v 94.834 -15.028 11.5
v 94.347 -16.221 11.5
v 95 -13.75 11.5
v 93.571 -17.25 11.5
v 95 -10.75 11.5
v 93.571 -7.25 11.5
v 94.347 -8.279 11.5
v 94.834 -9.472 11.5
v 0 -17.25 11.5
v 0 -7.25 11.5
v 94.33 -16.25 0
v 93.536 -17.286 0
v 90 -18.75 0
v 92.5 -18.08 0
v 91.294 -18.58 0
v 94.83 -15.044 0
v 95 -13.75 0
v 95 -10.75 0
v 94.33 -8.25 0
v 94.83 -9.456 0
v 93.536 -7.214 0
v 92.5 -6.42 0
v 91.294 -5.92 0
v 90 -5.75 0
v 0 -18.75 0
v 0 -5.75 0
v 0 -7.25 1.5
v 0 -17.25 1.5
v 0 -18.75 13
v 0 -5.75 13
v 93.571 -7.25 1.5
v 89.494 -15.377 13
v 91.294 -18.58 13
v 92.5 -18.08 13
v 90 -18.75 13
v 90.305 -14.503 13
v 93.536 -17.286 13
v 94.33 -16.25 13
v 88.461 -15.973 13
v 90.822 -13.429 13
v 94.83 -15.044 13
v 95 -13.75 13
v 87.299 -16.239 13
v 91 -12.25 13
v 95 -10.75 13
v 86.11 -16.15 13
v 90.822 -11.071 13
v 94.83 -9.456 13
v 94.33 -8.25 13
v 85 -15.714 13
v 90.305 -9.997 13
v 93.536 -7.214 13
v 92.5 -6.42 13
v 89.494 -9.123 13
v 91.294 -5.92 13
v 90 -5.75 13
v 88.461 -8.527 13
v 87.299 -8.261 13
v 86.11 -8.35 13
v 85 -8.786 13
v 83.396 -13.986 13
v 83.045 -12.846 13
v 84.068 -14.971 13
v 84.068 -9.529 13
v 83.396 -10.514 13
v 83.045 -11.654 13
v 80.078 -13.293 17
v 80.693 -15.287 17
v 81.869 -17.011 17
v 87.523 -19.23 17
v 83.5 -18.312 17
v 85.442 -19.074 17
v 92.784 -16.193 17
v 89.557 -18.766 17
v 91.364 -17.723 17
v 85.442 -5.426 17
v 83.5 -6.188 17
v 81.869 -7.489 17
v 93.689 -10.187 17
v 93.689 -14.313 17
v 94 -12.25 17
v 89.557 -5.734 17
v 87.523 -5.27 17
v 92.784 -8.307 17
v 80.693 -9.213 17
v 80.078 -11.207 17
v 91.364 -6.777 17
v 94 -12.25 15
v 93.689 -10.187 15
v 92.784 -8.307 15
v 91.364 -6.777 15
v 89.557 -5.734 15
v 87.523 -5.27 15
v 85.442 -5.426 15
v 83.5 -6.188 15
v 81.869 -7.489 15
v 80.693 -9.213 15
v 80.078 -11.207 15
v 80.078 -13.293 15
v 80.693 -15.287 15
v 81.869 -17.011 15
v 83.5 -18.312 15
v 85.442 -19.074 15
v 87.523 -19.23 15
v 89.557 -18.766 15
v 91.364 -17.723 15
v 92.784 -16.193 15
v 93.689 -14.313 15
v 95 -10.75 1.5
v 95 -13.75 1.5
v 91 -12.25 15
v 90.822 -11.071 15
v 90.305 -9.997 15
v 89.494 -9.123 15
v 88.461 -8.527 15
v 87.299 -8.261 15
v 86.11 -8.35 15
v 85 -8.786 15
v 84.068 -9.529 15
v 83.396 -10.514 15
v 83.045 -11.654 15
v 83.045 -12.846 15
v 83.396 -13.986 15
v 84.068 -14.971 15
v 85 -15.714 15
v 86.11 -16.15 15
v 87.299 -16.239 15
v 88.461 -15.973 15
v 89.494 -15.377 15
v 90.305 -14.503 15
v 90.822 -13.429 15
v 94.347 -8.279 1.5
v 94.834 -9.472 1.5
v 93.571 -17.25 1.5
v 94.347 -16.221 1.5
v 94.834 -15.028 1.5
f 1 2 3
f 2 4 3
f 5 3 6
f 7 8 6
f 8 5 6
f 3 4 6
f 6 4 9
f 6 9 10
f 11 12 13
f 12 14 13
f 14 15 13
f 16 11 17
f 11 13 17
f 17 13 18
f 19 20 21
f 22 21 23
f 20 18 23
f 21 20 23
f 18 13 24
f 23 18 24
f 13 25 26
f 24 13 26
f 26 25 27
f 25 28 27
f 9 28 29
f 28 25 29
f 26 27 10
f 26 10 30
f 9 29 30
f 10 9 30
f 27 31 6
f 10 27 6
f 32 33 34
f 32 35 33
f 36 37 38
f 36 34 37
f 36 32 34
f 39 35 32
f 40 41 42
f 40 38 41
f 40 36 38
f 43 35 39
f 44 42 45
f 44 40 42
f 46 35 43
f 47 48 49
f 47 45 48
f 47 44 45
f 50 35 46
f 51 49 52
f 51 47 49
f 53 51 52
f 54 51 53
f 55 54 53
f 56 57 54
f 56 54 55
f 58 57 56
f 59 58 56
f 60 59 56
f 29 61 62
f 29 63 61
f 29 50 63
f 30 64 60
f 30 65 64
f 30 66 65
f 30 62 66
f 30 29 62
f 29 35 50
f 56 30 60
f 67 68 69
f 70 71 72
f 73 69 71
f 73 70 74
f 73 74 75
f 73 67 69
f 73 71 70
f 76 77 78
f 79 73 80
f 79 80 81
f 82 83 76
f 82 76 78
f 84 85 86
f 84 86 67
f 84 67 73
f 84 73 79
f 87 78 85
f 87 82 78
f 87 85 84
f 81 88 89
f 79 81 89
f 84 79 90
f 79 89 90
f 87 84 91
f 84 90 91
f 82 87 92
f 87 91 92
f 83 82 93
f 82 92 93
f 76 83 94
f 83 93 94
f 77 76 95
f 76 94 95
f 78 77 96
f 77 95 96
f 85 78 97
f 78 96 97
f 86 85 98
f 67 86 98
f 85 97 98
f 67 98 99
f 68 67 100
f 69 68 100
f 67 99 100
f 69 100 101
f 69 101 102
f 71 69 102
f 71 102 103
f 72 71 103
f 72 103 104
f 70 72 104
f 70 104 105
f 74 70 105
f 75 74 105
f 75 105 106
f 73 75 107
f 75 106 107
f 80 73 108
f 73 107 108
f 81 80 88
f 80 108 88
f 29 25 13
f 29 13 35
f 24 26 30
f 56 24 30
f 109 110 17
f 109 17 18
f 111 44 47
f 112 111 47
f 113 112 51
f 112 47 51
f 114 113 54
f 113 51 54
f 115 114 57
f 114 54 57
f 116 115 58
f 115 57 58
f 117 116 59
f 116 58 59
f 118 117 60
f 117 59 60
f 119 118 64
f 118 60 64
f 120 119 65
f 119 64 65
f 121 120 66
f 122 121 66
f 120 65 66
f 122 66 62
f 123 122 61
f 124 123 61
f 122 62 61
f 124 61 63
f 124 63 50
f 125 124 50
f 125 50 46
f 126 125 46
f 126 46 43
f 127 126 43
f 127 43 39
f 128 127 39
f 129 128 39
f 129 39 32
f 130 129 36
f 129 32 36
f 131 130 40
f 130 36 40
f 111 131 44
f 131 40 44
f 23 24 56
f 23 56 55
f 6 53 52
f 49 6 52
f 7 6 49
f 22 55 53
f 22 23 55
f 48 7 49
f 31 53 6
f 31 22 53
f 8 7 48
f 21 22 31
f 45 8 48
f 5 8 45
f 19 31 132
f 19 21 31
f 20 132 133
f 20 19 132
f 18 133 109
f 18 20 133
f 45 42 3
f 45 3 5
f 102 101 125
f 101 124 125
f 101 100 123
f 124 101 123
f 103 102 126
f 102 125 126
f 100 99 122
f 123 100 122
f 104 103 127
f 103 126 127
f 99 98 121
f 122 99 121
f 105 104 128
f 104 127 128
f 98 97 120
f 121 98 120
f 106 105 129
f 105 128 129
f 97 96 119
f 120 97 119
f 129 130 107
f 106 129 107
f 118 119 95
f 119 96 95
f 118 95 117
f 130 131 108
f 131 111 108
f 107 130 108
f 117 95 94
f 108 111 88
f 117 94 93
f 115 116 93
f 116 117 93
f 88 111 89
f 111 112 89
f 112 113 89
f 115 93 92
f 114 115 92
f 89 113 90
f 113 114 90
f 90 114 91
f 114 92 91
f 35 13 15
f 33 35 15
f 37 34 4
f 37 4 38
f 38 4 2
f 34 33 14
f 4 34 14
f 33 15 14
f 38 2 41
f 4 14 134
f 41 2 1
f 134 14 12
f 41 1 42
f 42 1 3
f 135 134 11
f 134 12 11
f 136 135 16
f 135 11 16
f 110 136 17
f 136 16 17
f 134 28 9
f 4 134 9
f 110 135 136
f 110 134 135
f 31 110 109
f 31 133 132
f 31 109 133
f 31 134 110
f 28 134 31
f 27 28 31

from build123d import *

# Parameters (mm, degrees)
F0_W        = 12.9999973349
F0_H        = 13
F0_W_2      = 10
F0_H_2      = 10
F1_DEPTH    = 95
F2_T1_DEPTH = 38
F3_R        = 4
F4_DEPTH    = 2
F5_R        = 7
F5_R_2      = 4
F6_DEPTH    = 2


# Not quite as in the source:
# - a fillet or chamfer that OpenCascade refuses, or shapes differently, is made with other operations: its cross-section is extruded or revolved along the edge and cut away or added


with BuildPart() as f1:
    # F0 (on Right) → F1 (new body)
    with BuildSketch(Plane.YZ):
        with Locations((-12.2499999048, 6.5)):
            Rectangle(F0_W, F0_H)
        with Locations((-12.2499999048, 6.5)):
            Rectangle(F0_W_2, F0_H_2, mode=Mode.SUBTRACT)
    extrude(amount=F1_DEPTH)

    # F2: fillet of radius 5 on 2 edges, made by hand

    # F2_s2 → F2_t1 (cut)
    with BuildSketch(Plane.XY.offset(-12.5)):
        with BuildLine():
            ThreePointArc((90, -5.7500012374), (93.5355339059, -7.2144673315), (95, -10.7500012374))
            Line((95, -10.7500012374), (95, -5.7500012374))
            Line((95, -5.7500012374), (90, -5.7500012374))
        make_face()
        with BuildLine():
            ThreePointArc((90, -18.7499985722), (93.5355339059, -17.2855324782), (95, -13.7499985722))
            Line((95, -13.7499985722), (95, -18.7499985722))
            Line((95, -18.7499985722), (90, -18.7499985722))
        make_face()
    extrude(amount=F2_T1_DEPTH, mode=Mode.SUBTRACT)

    # F3 (on face) → F4 (join)
    with BuildSketch(Plane.XY.offset(13)):
        with Locations((87, -12.2499999048)):
            Circle(F3_R)
    extrude(amount=F4_DEPTH)

    # F5 (on face) → F6 (join)
    with BuildSketch(Plane.XY.offset(15)):
        with Locations((87, -12.2499999048)):
            Circle(F5_R)
        with Locations((87, -12.2499999048)):
            Circle(F5_R_2, mode=Mode.SUBTRACT)
        with Locations((87, -12.2499999048)):
            Circle(F5_R_2)
    extrude(amount=F6_DEPTH)


solid = f1.part
